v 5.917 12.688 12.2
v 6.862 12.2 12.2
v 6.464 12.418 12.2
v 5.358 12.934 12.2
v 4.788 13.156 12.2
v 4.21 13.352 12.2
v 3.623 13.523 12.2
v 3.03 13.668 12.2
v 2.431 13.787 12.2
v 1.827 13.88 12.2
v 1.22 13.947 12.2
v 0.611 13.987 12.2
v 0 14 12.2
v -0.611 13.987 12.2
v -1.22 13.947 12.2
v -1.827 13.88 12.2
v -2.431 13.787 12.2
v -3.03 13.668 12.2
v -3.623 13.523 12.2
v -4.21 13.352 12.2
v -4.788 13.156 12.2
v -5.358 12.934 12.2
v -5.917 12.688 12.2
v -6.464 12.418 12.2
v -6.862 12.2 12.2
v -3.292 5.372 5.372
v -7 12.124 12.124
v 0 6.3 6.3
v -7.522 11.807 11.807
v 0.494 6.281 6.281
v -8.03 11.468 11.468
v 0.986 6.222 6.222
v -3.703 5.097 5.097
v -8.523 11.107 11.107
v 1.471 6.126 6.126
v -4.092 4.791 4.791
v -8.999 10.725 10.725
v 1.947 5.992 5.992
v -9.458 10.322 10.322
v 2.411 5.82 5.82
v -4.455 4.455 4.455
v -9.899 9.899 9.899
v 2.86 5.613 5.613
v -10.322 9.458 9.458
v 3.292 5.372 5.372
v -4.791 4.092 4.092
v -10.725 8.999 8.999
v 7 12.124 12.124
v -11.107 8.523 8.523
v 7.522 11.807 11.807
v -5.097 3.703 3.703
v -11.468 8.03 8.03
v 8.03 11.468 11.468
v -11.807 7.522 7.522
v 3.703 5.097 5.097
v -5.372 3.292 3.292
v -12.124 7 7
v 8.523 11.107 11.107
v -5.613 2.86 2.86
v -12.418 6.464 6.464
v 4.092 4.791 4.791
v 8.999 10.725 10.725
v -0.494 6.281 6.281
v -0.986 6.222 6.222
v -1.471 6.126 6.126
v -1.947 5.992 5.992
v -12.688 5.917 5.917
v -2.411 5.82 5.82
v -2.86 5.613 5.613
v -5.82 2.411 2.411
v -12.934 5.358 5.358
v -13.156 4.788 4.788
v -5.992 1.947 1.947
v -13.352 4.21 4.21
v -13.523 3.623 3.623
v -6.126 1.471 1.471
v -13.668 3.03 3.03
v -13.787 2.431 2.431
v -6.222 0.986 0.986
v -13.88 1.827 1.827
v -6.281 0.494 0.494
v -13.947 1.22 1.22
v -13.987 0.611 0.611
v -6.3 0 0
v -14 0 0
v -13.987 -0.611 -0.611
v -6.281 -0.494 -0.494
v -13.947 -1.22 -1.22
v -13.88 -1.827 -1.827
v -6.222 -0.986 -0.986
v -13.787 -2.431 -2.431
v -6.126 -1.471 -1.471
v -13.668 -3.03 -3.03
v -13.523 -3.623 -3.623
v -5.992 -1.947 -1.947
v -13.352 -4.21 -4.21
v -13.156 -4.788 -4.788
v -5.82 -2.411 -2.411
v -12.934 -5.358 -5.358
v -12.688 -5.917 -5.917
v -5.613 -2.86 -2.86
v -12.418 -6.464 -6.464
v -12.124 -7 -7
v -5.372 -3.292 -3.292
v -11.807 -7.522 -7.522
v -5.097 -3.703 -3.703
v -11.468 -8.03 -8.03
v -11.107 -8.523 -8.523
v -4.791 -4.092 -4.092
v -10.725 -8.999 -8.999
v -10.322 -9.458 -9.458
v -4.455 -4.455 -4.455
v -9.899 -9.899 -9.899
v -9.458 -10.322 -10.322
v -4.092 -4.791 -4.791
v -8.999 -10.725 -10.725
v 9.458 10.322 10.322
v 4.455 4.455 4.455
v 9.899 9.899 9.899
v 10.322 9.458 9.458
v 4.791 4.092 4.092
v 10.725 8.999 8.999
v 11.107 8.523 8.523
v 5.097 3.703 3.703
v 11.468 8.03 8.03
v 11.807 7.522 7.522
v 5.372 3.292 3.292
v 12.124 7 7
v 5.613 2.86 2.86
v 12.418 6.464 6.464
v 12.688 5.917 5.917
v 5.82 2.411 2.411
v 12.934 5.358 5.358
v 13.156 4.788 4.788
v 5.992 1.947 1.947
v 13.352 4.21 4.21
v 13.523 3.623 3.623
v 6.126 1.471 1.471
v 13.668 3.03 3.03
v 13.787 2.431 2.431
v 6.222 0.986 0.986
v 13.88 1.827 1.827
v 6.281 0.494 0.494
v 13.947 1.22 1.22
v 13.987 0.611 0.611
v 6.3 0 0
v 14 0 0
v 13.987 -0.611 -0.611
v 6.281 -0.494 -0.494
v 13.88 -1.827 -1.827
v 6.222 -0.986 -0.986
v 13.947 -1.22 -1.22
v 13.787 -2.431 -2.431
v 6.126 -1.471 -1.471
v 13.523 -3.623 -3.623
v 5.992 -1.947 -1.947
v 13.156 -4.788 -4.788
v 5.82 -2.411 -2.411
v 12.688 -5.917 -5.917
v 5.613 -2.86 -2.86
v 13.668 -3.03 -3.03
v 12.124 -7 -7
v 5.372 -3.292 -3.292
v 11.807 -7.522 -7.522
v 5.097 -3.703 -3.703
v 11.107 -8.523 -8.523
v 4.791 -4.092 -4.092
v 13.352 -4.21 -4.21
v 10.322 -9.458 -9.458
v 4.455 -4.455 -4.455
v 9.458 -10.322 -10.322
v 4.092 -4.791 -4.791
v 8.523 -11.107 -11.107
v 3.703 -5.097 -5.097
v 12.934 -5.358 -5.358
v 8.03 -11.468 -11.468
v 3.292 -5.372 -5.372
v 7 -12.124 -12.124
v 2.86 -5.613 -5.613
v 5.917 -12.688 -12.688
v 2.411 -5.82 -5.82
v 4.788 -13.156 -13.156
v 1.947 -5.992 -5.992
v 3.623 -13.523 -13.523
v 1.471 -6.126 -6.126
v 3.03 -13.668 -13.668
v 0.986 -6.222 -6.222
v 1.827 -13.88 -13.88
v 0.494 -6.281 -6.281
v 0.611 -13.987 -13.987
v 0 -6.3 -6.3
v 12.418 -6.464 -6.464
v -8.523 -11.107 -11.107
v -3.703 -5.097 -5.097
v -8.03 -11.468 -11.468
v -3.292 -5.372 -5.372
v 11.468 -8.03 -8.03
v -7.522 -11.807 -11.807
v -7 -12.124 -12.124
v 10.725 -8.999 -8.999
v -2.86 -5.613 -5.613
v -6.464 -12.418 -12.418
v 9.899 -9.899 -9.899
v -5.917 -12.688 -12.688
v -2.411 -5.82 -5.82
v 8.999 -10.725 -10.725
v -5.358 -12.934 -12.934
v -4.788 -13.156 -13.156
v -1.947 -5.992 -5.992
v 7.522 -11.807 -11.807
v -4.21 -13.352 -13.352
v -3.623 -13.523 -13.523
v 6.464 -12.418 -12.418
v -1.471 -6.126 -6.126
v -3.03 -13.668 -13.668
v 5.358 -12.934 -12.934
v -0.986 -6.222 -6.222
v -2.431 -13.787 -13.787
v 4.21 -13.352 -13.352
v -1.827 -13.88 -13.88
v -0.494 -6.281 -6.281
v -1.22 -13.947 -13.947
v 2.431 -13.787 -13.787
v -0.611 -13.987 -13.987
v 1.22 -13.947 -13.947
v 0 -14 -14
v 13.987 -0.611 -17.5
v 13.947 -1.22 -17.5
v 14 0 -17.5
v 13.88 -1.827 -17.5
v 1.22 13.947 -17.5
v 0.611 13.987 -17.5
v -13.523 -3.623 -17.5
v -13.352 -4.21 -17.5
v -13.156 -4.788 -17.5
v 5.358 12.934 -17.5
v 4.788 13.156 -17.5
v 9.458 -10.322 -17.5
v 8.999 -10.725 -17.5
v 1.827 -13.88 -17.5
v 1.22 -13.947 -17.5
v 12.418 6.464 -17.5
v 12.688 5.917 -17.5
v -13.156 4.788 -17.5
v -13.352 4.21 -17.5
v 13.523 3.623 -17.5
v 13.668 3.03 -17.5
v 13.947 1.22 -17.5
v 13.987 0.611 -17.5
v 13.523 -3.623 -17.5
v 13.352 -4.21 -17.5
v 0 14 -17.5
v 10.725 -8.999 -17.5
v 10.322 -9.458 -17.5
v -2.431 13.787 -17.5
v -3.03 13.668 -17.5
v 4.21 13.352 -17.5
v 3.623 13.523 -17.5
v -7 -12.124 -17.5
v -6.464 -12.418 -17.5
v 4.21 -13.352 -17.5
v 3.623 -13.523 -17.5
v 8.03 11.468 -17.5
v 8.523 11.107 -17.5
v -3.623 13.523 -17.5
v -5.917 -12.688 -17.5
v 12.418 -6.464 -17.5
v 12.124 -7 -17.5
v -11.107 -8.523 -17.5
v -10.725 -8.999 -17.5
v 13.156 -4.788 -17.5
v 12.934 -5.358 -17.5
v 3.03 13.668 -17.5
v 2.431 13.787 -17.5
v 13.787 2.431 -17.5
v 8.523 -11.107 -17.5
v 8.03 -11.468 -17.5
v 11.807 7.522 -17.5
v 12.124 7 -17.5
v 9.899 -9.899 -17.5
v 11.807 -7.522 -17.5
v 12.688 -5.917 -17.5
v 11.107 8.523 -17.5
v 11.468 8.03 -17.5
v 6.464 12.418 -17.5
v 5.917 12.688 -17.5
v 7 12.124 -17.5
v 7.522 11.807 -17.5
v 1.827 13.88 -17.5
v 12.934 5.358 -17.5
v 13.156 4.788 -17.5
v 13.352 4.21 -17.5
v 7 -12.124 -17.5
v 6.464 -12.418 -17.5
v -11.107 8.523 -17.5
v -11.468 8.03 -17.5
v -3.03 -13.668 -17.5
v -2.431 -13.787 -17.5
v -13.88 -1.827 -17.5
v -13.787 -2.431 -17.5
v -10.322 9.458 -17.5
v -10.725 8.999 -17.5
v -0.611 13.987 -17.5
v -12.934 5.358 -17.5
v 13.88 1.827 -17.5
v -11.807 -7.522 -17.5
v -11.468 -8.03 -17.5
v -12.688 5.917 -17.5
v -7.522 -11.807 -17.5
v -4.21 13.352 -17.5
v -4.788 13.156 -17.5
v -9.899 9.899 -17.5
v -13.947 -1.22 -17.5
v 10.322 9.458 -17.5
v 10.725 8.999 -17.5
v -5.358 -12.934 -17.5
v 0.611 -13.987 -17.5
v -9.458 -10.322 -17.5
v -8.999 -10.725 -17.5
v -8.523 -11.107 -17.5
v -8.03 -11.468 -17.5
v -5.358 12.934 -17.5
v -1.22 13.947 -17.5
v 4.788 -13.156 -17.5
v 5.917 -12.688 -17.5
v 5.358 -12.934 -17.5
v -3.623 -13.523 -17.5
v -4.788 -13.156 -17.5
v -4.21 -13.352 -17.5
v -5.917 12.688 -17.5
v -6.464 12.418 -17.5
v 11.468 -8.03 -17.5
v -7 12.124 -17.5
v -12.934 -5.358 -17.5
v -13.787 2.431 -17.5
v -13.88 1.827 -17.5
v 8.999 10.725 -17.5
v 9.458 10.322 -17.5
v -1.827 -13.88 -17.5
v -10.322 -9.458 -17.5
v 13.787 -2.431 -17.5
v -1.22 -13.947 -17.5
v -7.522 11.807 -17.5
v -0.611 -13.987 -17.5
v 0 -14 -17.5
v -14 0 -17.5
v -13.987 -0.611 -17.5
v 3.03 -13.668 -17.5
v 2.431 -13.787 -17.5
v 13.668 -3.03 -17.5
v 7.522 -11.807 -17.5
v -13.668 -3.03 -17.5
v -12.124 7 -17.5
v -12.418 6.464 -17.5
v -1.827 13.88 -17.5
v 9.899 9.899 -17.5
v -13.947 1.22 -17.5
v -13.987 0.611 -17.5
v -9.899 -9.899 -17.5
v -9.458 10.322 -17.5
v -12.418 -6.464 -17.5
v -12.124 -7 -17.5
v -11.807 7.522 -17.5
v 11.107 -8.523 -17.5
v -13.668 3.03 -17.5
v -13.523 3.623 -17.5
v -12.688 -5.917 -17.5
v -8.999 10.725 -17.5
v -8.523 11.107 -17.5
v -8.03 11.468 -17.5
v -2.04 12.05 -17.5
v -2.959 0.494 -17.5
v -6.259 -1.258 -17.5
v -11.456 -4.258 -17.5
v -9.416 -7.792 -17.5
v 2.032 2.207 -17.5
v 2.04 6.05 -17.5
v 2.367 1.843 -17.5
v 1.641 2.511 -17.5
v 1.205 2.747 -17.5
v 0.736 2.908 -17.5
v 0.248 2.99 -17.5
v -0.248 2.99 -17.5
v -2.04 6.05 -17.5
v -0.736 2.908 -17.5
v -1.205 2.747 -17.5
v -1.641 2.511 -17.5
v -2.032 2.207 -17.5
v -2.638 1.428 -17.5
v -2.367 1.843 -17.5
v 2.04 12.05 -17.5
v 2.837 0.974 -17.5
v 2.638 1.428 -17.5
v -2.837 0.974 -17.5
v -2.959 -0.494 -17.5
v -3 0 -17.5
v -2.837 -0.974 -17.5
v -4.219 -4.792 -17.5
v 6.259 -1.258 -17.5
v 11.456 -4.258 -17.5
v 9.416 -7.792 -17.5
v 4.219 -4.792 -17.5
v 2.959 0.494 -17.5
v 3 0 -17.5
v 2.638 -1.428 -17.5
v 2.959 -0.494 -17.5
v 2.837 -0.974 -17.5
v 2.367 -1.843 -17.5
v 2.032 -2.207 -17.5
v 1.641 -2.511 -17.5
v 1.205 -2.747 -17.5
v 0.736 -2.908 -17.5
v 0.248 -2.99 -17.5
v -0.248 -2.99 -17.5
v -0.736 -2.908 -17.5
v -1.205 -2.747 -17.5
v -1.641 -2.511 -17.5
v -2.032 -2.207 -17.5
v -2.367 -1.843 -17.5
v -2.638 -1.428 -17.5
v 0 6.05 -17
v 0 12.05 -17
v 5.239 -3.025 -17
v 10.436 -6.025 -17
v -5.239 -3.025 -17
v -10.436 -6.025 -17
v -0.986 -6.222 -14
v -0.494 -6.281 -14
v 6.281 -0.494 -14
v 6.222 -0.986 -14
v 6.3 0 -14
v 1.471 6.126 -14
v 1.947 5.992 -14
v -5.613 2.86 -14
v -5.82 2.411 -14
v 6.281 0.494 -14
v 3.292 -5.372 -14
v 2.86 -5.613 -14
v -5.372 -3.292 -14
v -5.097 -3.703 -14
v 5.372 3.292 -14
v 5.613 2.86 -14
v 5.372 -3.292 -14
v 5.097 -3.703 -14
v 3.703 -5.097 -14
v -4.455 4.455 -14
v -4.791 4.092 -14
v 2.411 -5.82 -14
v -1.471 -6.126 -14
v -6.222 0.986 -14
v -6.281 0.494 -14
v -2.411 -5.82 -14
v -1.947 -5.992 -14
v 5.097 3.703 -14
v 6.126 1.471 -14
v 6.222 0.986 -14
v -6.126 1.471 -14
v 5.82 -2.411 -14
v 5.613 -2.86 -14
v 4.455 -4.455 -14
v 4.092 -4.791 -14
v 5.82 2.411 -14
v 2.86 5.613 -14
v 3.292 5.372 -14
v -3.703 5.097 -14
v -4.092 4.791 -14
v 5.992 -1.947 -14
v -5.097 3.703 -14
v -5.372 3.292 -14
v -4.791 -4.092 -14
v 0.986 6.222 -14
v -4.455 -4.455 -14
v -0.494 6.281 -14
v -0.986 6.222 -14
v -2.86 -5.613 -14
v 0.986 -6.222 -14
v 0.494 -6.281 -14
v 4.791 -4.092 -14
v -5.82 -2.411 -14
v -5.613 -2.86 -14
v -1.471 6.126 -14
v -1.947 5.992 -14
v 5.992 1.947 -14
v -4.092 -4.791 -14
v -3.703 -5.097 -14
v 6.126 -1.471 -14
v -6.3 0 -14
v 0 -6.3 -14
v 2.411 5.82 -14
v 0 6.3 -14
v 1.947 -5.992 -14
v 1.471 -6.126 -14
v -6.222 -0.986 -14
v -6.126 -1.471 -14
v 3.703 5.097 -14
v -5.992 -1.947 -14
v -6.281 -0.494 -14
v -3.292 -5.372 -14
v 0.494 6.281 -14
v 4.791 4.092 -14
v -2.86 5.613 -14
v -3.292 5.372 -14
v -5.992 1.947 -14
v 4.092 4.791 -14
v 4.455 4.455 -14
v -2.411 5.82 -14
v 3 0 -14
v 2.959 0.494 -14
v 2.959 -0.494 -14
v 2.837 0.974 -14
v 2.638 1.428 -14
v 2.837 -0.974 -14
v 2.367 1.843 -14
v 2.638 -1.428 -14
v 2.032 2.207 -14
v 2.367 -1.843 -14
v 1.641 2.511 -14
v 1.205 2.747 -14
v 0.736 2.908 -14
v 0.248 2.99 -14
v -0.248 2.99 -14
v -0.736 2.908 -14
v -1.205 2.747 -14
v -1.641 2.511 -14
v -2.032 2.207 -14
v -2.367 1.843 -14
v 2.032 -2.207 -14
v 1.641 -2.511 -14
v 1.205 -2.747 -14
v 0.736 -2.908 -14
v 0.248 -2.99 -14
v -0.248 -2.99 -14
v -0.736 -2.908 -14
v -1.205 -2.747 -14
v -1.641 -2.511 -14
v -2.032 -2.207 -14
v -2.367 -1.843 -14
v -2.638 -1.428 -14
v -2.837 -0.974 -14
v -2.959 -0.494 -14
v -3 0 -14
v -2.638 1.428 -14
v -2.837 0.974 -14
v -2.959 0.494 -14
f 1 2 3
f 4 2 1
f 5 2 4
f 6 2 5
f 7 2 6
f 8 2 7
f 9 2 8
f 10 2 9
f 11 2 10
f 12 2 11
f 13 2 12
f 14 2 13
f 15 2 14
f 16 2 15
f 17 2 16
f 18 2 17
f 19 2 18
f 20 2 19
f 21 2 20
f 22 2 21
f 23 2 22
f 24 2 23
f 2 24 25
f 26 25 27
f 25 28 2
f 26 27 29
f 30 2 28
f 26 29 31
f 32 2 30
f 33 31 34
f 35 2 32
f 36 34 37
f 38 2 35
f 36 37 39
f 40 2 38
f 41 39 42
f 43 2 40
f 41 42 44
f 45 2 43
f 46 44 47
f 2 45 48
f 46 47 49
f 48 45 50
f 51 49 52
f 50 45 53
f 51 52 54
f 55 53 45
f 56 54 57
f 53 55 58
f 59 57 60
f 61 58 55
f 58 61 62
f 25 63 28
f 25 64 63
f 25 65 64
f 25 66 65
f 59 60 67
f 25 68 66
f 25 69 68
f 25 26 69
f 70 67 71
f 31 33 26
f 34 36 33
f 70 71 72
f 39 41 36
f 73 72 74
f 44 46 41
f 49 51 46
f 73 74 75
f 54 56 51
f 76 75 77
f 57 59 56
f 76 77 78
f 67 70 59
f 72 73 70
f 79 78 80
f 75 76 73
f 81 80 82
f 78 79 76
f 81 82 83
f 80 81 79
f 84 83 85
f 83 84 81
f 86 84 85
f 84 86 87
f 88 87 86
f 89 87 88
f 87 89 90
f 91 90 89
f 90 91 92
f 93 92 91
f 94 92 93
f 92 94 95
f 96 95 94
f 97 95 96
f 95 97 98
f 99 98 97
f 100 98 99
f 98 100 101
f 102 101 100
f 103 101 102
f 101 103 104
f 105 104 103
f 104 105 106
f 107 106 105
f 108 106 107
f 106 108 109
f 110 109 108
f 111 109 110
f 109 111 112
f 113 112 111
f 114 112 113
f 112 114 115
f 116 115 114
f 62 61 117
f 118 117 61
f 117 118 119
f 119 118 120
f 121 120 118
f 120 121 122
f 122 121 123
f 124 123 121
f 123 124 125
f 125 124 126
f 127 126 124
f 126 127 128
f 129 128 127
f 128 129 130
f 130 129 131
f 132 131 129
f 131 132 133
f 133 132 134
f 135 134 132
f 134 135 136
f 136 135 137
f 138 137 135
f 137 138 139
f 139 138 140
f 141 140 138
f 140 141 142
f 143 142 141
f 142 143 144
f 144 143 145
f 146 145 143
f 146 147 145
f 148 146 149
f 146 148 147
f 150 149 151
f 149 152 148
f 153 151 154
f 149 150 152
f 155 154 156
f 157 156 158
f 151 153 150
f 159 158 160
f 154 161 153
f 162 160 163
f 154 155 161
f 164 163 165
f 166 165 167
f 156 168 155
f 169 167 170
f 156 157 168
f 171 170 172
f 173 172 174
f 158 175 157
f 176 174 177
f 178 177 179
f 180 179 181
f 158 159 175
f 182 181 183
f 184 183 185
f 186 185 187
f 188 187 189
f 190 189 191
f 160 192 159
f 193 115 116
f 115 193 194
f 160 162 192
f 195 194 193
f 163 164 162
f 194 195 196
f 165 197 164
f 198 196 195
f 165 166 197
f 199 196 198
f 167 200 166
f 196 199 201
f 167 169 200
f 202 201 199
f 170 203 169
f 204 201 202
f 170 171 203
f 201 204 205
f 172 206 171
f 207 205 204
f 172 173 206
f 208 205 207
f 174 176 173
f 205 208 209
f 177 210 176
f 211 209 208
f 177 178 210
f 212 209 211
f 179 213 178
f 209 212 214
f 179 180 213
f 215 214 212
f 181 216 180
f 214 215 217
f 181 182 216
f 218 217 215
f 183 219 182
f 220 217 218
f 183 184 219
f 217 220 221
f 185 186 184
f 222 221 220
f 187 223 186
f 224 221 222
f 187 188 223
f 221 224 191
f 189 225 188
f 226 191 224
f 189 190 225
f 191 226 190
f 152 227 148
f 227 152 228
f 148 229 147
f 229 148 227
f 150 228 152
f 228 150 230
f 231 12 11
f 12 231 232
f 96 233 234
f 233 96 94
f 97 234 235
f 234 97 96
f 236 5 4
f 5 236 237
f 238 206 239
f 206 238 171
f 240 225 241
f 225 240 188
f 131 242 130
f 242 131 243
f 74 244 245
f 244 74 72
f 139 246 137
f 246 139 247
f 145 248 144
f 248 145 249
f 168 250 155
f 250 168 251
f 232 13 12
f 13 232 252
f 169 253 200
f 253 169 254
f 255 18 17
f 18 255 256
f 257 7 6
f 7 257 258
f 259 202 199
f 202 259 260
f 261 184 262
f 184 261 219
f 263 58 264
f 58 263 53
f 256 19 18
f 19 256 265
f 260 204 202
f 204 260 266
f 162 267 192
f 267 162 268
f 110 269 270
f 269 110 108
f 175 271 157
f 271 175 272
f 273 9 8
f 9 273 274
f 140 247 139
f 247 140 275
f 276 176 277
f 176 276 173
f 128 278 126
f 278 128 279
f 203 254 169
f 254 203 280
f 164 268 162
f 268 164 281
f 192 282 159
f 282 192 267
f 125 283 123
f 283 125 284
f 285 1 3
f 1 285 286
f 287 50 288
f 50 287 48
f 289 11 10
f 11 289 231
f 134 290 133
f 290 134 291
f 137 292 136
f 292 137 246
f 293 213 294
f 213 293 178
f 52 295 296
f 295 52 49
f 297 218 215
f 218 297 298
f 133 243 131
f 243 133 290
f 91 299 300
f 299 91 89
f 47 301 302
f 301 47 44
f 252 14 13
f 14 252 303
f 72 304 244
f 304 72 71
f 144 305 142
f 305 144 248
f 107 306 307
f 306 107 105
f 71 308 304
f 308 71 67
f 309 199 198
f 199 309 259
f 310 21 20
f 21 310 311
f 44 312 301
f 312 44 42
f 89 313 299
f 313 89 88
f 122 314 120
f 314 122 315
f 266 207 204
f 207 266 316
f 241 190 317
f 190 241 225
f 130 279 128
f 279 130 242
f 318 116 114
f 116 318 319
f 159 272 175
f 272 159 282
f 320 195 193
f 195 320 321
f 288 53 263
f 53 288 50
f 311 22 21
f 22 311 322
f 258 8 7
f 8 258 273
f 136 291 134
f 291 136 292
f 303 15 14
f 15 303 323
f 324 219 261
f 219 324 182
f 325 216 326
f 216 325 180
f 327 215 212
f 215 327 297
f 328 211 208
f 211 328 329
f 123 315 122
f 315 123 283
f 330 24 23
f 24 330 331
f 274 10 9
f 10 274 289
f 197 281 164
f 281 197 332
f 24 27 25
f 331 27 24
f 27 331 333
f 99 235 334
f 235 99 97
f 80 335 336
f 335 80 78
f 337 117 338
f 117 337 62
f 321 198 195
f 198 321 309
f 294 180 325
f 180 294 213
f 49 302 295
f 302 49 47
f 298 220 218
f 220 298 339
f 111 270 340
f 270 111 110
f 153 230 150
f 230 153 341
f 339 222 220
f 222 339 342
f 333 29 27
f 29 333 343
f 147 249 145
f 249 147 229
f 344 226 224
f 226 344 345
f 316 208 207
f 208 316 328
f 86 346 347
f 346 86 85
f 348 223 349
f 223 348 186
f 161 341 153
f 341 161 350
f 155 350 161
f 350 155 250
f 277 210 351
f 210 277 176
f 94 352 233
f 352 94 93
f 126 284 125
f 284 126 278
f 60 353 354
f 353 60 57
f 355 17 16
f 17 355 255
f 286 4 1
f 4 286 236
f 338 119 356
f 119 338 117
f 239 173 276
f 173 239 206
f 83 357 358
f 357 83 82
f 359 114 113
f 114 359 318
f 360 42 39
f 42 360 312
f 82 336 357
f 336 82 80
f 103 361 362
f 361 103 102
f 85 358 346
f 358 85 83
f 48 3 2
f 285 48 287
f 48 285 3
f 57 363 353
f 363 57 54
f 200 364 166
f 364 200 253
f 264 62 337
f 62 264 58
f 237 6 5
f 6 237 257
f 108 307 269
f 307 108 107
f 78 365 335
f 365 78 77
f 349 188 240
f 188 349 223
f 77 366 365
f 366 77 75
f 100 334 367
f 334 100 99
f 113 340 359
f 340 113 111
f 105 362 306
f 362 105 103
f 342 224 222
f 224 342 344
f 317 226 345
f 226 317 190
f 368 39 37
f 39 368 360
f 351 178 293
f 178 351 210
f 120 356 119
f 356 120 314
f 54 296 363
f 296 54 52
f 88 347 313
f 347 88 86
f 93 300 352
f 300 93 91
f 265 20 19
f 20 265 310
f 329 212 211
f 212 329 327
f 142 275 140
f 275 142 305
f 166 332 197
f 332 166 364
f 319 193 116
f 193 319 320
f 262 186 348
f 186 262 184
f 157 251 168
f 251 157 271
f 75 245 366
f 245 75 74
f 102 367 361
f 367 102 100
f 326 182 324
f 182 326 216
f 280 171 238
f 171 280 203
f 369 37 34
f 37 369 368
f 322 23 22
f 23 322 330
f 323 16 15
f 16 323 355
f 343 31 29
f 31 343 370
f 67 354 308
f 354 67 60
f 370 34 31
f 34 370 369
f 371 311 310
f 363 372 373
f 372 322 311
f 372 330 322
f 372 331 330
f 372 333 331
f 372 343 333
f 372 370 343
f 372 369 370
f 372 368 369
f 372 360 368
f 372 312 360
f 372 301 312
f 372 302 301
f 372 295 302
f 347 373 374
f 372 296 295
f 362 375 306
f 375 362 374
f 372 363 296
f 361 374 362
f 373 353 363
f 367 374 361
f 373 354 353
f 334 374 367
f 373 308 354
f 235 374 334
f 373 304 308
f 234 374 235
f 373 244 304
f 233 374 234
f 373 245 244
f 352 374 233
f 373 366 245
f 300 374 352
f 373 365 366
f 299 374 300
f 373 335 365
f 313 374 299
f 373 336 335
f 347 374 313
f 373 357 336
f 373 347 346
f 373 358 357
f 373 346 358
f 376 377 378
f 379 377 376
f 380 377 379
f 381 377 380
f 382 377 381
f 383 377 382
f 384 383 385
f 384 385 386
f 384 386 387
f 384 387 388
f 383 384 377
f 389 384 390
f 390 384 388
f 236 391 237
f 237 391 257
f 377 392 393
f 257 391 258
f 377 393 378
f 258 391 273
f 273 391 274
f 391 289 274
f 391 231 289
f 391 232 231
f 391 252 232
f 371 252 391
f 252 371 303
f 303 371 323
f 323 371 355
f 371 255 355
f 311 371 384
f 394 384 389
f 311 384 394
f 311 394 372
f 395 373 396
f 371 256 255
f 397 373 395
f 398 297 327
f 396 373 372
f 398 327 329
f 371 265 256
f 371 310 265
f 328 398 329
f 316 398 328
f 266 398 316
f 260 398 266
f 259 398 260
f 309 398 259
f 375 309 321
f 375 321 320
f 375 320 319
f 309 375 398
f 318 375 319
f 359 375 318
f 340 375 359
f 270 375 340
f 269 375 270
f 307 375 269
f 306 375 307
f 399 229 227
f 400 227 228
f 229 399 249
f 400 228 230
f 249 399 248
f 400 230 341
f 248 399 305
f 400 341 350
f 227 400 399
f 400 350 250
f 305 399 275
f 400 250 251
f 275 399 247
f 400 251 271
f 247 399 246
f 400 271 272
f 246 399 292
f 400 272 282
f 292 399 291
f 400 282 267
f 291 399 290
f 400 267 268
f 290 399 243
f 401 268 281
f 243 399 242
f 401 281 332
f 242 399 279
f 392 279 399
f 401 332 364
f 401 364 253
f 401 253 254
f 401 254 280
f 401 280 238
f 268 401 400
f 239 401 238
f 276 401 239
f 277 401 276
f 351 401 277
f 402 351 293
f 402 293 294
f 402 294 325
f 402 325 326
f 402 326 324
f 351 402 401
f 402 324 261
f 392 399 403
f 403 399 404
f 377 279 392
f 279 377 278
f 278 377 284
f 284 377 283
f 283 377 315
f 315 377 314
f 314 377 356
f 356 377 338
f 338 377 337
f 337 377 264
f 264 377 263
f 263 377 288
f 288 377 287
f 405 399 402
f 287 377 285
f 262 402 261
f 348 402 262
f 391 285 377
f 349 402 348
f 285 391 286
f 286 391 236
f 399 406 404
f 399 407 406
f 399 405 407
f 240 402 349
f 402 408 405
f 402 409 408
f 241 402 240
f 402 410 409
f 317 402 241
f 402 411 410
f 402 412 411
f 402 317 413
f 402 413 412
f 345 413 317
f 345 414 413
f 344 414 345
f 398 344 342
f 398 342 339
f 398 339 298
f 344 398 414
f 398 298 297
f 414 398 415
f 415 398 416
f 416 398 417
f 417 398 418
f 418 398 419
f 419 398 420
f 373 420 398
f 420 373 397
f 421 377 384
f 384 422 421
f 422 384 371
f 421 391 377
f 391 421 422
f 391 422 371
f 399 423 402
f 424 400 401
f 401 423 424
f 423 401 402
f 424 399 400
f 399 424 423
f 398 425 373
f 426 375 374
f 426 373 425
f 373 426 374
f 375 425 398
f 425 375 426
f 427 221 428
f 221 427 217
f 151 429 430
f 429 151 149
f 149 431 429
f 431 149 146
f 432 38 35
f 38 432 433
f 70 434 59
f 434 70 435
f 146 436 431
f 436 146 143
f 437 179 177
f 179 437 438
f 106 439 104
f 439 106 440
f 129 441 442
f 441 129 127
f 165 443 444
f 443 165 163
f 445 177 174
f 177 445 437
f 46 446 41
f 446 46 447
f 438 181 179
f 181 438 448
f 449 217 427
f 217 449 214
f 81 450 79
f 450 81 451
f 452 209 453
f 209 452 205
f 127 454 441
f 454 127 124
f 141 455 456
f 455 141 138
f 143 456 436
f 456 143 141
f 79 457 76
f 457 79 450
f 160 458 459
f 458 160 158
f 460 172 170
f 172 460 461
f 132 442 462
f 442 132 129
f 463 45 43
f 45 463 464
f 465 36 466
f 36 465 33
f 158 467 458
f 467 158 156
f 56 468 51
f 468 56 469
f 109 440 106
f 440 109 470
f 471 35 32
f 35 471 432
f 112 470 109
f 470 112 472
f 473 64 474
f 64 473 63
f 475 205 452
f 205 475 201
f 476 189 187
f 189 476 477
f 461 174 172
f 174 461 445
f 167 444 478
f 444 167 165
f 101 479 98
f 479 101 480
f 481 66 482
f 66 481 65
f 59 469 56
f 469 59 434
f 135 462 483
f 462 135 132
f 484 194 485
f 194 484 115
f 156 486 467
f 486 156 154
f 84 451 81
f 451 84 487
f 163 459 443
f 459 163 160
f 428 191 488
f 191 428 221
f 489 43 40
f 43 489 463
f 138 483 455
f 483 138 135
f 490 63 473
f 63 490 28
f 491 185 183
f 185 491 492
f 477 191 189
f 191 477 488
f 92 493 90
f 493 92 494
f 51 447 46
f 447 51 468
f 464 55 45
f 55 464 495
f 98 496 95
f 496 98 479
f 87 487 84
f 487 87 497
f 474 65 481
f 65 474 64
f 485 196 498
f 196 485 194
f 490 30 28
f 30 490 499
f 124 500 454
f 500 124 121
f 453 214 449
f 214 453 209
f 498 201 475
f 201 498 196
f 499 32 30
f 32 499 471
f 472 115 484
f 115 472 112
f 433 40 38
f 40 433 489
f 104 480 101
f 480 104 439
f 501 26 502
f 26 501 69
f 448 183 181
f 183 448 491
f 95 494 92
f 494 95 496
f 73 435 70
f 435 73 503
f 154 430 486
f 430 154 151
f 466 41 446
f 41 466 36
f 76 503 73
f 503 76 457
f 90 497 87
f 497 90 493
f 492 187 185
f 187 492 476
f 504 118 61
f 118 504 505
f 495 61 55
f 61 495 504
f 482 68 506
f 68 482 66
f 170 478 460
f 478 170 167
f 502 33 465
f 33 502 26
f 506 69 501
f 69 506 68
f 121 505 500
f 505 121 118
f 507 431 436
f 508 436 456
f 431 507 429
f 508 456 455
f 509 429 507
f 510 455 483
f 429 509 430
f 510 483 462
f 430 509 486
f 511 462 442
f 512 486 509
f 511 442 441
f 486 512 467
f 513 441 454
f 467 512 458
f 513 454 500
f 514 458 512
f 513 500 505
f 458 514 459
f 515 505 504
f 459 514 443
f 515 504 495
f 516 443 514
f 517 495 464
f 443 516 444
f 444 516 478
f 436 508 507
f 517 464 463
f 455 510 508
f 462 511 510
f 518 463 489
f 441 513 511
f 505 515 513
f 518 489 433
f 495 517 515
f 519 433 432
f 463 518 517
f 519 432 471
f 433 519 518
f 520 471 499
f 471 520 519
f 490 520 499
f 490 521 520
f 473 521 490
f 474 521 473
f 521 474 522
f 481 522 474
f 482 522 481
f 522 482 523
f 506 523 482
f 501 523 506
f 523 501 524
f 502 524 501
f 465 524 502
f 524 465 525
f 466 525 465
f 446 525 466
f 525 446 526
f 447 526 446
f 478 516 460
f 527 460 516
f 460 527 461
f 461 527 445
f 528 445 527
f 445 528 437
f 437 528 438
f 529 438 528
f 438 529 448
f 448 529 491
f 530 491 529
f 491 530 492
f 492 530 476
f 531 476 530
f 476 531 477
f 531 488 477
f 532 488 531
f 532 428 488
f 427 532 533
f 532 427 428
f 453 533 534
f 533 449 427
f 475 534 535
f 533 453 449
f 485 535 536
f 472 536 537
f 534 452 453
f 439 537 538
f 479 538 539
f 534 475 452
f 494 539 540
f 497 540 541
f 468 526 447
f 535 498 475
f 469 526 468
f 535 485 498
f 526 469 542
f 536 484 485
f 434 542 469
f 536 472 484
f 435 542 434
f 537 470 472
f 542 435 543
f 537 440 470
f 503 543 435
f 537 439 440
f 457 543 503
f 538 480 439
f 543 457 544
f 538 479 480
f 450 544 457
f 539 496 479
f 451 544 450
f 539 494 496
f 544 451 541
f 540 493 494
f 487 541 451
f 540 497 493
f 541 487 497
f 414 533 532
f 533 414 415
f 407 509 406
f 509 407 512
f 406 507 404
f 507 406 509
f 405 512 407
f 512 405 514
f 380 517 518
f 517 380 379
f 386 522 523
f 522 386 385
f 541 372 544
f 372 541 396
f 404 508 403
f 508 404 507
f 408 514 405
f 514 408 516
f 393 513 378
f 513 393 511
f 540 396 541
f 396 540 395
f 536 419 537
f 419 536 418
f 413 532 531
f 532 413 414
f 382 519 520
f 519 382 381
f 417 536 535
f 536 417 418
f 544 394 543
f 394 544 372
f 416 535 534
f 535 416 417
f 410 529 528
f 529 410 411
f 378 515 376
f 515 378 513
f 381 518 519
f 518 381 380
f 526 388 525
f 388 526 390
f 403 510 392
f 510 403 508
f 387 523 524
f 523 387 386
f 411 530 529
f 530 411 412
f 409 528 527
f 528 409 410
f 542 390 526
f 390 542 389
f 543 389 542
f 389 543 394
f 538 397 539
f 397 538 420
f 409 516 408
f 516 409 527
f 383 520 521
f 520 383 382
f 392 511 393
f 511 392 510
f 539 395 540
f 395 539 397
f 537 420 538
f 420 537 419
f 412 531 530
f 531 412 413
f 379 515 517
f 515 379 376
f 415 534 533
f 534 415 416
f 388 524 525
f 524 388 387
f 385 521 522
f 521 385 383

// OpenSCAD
include <FullAssembly.scad>
/* [Hidden] */
isStandalone=false;

rotate([180,0,0])
// Mirror Holder
secondaryattachment(dia, toffset, unibodypad, cut, ball, adjustbolt, centralbolt, sec_mdia, sec_mthick, secondaryattachment);
